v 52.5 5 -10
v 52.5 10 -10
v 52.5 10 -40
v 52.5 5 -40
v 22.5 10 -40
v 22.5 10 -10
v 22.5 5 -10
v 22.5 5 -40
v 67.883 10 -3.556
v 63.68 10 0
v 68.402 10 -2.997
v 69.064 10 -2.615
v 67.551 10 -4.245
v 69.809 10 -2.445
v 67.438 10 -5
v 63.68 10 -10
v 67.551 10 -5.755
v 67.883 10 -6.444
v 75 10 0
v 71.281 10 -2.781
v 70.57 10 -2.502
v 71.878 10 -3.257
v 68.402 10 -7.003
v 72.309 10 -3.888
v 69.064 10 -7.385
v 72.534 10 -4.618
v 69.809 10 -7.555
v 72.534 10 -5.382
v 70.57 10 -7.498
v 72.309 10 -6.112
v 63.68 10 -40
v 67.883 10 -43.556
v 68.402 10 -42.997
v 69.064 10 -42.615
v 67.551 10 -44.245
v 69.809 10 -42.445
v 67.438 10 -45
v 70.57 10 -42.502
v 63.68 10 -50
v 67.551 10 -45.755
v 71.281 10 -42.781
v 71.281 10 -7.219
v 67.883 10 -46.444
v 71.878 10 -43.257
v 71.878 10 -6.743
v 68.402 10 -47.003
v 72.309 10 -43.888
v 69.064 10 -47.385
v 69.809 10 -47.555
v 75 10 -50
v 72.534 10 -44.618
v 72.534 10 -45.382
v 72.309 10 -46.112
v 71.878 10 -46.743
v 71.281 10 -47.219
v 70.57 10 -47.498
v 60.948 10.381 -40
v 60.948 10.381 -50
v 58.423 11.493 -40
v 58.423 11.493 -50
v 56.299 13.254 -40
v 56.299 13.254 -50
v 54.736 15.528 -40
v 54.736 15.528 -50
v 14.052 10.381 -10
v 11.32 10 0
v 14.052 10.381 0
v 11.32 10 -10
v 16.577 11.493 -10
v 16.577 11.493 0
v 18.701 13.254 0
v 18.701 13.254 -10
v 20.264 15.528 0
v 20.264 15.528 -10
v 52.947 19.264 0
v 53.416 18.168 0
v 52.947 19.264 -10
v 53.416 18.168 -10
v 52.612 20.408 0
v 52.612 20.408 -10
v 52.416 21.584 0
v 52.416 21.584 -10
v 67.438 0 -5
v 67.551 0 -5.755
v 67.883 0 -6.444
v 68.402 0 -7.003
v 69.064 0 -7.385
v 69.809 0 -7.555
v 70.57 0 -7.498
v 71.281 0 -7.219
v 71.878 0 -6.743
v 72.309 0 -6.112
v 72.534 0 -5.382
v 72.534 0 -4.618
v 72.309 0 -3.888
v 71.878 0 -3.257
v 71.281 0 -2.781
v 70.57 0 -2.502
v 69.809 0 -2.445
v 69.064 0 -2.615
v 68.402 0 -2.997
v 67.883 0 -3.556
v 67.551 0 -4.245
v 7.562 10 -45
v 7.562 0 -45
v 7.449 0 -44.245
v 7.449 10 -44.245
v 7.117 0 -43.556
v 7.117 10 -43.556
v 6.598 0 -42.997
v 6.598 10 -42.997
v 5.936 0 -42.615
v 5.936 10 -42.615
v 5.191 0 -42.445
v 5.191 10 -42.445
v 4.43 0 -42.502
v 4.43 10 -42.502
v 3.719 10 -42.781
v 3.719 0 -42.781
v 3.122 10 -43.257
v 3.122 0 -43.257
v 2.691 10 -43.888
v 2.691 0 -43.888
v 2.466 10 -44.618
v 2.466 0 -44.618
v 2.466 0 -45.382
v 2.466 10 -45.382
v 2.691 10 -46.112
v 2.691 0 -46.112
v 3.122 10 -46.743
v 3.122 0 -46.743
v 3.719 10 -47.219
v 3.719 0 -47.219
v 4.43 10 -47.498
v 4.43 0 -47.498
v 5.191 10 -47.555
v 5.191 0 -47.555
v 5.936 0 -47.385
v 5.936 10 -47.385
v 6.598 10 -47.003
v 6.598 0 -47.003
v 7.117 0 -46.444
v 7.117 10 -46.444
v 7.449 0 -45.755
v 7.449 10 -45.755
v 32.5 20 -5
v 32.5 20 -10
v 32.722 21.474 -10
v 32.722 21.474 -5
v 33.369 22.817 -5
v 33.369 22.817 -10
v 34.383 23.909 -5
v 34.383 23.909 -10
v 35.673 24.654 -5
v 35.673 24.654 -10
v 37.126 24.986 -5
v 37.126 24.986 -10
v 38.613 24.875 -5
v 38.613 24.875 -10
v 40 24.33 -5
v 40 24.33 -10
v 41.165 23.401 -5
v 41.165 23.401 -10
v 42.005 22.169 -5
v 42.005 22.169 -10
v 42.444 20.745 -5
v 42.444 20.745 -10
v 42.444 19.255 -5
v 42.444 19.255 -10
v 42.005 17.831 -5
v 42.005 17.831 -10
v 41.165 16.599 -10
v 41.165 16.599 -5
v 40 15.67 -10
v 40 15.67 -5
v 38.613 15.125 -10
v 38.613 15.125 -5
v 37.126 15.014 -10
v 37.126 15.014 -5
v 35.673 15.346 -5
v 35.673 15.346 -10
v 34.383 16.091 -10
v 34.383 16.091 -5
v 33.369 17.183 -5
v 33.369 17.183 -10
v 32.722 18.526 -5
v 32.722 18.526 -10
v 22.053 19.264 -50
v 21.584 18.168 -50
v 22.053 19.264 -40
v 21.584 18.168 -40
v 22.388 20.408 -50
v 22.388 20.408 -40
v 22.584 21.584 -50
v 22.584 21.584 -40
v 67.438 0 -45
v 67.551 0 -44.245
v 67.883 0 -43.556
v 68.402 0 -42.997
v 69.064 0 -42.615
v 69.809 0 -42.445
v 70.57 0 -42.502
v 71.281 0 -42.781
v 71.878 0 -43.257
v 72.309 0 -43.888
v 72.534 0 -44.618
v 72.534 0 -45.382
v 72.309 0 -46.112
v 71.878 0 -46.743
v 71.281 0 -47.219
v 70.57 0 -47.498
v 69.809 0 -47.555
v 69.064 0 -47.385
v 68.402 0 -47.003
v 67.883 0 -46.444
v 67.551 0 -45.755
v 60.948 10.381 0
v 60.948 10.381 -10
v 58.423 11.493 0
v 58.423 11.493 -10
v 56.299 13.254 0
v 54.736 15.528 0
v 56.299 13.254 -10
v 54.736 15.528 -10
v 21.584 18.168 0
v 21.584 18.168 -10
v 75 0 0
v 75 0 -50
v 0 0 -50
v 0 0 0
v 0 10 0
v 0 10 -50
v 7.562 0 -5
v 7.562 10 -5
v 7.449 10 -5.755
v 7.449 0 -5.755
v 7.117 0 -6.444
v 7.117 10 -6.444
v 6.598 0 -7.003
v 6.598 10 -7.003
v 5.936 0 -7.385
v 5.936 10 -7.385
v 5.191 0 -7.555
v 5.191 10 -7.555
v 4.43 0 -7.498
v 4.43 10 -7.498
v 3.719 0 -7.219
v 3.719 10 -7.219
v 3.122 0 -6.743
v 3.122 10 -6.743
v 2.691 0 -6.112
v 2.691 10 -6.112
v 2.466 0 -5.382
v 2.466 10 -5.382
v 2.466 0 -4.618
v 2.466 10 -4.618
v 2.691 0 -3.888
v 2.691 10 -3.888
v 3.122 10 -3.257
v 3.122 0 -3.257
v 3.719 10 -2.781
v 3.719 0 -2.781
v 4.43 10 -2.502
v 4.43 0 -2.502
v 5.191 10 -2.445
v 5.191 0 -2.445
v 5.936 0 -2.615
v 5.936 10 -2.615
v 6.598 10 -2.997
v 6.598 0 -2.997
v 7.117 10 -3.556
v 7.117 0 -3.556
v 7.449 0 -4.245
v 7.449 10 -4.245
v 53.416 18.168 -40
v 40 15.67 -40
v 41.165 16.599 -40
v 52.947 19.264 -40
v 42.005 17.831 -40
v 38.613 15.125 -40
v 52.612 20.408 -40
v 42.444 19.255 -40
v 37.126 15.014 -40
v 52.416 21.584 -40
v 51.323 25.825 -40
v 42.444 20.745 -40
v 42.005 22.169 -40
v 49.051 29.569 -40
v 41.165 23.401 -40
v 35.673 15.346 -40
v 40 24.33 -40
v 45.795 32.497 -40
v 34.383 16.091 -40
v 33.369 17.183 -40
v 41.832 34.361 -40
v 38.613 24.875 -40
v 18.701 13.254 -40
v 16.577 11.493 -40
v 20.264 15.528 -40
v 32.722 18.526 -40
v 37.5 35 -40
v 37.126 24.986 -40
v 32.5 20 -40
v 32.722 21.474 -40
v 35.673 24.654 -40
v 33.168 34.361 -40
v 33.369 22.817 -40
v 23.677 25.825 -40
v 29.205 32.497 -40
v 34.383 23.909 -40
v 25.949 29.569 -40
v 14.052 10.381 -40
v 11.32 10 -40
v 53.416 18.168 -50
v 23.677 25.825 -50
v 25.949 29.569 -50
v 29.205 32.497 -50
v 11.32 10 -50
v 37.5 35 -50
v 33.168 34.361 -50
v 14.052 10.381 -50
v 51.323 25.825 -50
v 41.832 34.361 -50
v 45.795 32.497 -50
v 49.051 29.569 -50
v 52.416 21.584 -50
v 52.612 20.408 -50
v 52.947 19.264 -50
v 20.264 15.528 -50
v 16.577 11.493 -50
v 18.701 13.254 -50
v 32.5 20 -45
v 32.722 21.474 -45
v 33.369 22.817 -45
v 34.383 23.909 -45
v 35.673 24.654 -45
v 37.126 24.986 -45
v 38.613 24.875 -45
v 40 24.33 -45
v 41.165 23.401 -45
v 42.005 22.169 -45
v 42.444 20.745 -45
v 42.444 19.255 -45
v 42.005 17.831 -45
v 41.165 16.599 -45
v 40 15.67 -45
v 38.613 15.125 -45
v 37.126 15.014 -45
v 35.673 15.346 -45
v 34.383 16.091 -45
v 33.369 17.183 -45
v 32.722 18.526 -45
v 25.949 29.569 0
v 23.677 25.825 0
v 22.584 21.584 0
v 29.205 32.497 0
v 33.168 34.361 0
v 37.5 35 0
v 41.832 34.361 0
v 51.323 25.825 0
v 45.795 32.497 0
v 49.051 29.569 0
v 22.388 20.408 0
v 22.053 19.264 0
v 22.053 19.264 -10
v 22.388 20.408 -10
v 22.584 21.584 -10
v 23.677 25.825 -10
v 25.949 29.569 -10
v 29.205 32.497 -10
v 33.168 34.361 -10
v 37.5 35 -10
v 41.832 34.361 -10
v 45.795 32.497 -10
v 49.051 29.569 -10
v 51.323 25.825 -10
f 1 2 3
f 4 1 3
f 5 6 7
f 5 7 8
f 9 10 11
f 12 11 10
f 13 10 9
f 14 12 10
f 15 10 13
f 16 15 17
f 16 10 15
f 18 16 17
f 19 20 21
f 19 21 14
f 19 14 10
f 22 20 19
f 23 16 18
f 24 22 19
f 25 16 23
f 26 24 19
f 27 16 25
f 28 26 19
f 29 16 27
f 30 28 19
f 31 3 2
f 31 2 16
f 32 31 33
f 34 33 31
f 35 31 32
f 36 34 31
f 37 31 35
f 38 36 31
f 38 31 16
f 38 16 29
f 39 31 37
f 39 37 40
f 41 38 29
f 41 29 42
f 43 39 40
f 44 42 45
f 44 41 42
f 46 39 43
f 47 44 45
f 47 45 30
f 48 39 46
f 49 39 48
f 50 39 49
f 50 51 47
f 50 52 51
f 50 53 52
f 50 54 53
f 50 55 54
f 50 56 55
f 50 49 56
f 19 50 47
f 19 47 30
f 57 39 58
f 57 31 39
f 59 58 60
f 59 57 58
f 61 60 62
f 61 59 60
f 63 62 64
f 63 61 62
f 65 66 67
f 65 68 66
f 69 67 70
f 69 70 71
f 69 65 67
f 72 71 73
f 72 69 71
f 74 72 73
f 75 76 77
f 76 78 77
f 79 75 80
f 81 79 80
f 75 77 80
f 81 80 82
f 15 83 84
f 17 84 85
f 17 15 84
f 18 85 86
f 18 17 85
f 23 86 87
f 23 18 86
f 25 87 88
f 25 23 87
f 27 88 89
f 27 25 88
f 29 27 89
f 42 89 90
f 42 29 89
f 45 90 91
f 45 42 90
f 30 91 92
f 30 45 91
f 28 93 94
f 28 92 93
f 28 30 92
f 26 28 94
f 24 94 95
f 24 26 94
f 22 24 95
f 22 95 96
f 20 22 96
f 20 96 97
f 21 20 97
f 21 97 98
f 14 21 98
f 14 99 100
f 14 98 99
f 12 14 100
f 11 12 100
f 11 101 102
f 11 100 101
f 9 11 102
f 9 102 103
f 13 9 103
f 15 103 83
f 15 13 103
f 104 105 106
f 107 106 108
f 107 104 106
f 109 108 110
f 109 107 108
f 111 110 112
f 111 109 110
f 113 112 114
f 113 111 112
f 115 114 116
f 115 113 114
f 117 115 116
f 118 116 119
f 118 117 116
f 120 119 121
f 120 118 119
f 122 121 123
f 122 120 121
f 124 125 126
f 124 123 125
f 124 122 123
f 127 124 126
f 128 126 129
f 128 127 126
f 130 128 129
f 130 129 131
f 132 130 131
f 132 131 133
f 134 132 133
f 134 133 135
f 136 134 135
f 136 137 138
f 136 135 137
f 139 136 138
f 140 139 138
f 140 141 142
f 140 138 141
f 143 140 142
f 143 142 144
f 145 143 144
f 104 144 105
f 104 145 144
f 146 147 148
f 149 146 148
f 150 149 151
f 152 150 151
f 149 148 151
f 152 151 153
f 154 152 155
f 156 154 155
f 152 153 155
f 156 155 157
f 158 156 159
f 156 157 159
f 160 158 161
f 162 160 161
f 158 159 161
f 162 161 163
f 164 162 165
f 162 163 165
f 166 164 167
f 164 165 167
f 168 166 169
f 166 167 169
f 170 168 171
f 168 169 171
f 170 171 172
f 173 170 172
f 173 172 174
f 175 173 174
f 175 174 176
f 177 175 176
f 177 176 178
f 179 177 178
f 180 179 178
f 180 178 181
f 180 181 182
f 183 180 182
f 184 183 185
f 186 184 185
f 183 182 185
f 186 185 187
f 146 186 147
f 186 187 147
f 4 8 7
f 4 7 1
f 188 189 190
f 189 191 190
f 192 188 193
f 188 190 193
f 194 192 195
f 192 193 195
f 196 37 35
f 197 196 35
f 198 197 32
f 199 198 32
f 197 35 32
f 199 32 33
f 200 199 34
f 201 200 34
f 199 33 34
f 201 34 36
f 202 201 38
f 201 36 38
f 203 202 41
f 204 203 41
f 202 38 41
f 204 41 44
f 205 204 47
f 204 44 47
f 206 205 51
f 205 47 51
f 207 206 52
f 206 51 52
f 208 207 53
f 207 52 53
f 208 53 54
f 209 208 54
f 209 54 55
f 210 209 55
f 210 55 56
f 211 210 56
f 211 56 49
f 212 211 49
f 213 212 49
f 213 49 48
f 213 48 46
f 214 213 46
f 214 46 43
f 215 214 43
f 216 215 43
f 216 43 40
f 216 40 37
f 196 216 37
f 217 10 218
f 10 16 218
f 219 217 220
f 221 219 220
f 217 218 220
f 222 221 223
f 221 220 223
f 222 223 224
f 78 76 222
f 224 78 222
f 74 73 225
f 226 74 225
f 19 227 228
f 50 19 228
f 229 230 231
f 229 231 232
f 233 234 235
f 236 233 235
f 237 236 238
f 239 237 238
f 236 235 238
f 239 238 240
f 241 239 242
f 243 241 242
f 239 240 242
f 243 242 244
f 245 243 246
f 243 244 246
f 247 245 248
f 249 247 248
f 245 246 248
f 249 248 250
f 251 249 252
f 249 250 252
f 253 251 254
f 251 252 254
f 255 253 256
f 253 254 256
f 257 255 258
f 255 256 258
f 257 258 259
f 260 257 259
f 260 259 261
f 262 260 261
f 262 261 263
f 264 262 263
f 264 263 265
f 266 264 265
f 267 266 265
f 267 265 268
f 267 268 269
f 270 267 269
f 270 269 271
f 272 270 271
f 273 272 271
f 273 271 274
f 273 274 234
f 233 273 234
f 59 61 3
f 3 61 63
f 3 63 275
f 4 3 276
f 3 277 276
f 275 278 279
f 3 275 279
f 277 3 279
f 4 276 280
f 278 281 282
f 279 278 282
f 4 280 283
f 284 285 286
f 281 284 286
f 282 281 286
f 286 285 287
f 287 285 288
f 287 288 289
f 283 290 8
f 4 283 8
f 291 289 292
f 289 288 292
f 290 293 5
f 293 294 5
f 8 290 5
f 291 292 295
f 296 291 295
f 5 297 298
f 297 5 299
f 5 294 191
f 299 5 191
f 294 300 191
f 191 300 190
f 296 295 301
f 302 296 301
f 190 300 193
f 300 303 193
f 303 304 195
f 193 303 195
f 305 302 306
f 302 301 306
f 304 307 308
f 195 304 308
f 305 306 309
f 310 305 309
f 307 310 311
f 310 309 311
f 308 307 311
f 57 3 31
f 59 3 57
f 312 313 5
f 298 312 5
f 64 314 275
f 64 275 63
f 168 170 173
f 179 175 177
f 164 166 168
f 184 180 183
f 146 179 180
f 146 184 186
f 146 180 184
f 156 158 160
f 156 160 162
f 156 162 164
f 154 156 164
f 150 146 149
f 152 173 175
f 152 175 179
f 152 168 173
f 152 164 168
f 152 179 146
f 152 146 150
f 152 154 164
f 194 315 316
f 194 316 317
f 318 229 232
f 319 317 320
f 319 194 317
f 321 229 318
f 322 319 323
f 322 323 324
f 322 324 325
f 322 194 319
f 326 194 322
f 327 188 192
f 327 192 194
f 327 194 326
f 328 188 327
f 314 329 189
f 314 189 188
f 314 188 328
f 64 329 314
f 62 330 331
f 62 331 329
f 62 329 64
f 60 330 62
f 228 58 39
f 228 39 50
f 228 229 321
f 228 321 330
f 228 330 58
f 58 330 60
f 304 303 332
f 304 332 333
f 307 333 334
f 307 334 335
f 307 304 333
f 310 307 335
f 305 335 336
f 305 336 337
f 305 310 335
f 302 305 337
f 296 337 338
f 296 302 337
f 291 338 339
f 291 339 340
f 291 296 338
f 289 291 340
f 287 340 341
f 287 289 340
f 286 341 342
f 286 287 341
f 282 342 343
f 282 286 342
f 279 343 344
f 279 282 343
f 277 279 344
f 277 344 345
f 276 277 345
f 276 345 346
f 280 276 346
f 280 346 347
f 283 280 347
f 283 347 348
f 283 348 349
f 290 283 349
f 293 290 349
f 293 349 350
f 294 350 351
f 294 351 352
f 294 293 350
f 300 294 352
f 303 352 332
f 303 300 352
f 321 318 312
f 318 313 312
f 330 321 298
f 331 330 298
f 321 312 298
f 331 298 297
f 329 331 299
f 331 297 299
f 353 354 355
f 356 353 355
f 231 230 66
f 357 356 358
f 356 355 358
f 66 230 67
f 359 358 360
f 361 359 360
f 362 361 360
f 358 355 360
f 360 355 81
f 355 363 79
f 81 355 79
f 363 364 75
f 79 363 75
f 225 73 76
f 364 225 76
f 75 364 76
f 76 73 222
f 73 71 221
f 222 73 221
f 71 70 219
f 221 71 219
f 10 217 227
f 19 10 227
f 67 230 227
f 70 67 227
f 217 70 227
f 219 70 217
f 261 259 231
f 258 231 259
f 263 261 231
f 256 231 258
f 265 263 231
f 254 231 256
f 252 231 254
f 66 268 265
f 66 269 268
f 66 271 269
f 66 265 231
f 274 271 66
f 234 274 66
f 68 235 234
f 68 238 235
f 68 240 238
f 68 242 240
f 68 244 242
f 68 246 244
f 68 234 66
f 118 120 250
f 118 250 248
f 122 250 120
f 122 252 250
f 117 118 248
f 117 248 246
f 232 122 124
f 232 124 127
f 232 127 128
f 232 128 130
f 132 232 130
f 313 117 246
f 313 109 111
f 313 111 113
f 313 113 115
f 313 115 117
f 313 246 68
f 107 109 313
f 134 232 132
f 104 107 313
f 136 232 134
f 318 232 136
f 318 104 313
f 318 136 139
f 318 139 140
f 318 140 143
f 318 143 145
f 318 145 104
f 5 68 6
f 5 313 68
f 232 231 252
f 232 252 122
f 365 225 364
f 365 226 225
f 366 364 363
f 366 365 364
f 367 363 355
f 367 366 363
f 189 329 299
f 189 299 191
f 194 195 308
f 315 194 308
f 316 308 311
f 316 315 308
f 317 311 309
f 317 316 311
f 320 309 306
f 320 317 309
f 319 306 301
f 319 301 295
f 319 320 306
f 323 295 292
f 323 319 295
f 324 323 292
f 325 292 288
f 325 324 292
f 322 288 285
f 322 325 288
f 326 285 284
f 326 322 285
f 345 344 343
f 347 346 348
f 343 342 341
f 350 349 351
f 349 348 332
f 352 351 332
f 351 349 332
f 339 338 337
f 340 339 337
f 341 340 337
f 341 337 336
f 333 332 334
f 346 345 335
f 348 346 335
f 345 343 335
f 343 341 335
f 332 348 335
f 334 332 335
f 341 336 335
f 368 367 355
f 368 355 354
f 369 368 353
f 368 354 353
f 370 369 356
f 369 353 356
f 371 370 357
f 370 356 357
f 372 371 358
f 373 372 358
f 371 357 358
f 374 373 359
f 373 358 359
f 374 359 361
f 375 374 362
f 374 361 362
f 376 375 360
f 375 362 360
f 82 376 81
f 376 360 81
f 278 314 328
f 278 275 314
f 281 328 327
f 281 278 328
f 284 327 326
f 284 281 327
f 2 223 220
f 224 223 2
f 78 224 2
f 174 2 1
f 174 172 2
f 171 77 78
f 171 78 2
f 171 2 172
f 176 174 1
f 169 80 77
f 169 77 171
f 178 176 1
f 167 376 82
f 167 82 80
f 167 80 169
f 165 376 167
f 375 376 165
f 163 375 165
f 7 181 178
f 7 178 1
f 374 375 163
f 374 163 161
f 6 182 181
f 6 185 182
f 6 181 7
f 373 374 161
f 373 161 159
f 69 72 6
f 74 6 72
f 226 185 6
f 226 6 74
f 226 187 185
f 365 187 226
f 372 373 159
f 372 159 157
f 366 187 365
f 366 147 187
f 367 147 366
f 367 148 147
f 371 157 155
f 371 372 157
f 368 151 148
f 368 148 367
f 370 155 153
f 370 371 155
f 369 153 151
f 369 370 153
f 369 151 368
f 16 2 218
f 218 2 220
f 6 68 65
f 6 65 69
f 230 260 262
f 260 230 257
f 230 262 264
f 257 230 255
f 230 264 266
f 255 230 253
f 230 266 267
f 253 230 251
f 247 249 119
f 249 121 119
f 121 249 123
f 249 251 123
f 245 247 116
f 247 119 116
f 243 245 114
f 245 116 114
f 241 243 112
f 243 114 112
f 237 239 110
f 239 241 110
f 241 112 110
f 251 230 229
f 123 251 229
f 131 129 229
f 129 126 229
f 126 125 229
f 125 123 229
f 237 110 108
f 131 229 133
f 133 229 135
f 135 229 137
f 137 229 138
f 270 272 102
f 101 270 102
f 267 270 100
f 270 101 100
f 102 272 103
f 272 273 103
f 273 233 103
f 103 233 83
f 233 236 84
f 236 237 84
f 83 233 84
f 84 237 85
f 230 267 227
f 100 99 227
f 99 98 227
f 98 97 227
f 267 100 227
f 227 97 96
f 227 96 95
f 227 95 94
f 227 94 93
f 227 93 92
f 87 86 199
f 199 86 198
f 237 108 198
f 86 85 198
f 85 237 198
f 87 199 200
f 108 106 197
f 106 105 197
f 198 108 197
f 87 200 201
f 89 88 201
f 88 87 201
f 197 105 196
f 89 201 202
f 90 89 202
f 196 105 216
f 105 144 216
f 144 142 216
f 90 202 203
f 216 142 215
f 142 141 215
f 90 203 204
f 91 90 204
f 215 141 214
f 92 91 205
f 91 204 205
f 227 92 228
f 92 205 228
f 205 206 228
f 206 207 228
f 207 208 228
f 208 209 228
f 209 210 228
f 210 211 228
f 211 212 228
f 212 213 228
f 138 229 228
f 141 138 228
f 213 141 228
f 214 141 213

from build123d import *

# Parameters (mm, degrees)
SKETCH1_W               = 75
SKETCH1_H               = 50
BOSS_EXTRUDE1_DEPTH     = 10
BOSS_EXTRUDE2_DEPTH     = 10
FILLET1_R               = 10
SKETCH4_R               = 5
CUT_EXTRUDE1_DEPTH      = 5
FILLET1_OF_MIRROR1_R    = 10
SKETCH5_R               = 2.5625
CUT_EXTRUDE2_DEPTH      = 11
MIRROR3_COPY_1_SKETCH_R = 2.5625
MIRROR3_COPY_1_DEPTH    = 11
SKETCH6_W               = 30
SKETCH6_H               = 30
CUT_EXTRUDE3_DEPTH      = 5


with BuildPart() as part:
    # Sketch1 → Boss-Extrude1 (new body)
    with BuildSketch(Plane(origin=(0, 0, 0), x_dir=(1, 0, 0), z_dir=(0, 1, 0))):
        with Locations((37.5, 25)):
            Rectangle(SKETCH1_W, SKETCH1_H)
    extrude(amount=BOSS_EXTRUDE1_DEPTH)

    # Sketch2 → Boss-Extrude2 (add)
    with BuildSketch(Plane.XY):
        with BuildLine():
            Line((52.5, 20), (57.5, 10))
            Line((57.5, 10), (17.5, 10))
            Line((17.5, 10), (22.5, 20))
            ThreePointArc((22.5, 20), (37.5, 35), (52.5, 20))
        make_face()
    boss_extrude2 = extrude(amount=-BOSS_EXTRUDE2_DEPTH)

    # Fillet1
    fillet1_edges = [part.edges().sort_by_distance(p)[0] for p in [
        (22.5, 20, -5),
        (52.5, 20, -5),
        (57.5, 10, -5),
        (17.5, 10, -5),
    ]]
    fillet(fillet1_edges, radius=FILLET1_R)

    # Sketch4 → Cut-Extrude1 (cut)
    with BuildSketch(Plane(origin=(0, 0, -10), x_dir=(-1, 0, 0), z_dir=(0, 0, -1))):
        with Locations((-37.5, 20)):
            Circle(SKETCH4_R)
    cut_extrude1 = extrude(amount=-CUT_EXTRUDE1_DEPTH, mode=Mode.SUBTRACT)

    # Mirror1: Boss-Extrude2, Cut-Extrude1 across plane
    add(boss_extrude2.mirror(Plane(origin=(0, 0, -25), x_dir=(1, 0, 0), z_dir=(0, 0, -1))))
    add(cut_extrude1.mirror(Plane(origin=(0, 0, -25), x_dir=(1, 0, 0), z_dir=(0, 0, -1))), mode=Mode.SUBTRACT)

    # Fillet1 of Mirror1
    fillet1_of_mirror1_edges = [part.edges().sort_by_distance(p)[0] for p in [
        (22.5, 20, -45),
        (52.5, 20, -45),
        (57.5, 10, -45),
        (17.5, 10, -45),
    ]]
    fillet(fillet1_of_mirror1_edges, radius=FILLET1_OF_MIRROR1_R)

    # Sketch5 → Cut-Extrude2 (cut, through all)
    with BuildSketch(Plane(origin=(0, 10, 0), x_dir=(1, 0, 0), z_dir=(0, 1, 0))):
        with Locations((5, 5)):
            Circle(SKETCH5_R)
    cut_extrude2 = extrude(amount=-CUT_EXTRUDE2_DEPTH, mode=Mode.SUBTRACT)

    # Mirror2: Cut-Extrude2 across plane
    add(cut_extrude2.mirror(Plane(origin=(0, 0, -25), x_dir=(1, 0, 0), z_dir=(0, 0, -1))), mode=Mode.SUBTRACT)

    # Mirror3: Cut-Extrude2 across plane
    add(cut_extrude2.mirror(Plane(origin=(37.5, 0, 0), x_dir=(0, 0, 1), z_dir=(1, 0, 0))), mode=Mode.SUBTRACT)

    # Mirror3 copy 1 sketch → Mirror3 copy 1 (cut, through all)
    with BuildSketch(Plane(origin=(75, 10, -50), x_dir=(-1, 0, 0), z_dir=(0, 1, 0))):
        with Locations((5, 5)):
            Circle(MIRROR3_COPY_1_SKETCH_R)
    extrude(amount=-MIRROR3_COPY_1_DEPTH, mode=Mode.SUBTRACT)

    # Sketch6 → Cut-Extrude3 (cut)
    with BuildSketch(Plane(origin=(0, 10, 0), x_dir=(1, 0, 0), z_dir=(0, 1, 0))):
        with Locations((37.5, 25)):
            Rectangle(SKETCH6_W, SKETCH6_H)
    extrude(amount=-CUT_EXTRUDE3_DEPTH, mode=Mode.SUBTRACT)


solid = part.part
